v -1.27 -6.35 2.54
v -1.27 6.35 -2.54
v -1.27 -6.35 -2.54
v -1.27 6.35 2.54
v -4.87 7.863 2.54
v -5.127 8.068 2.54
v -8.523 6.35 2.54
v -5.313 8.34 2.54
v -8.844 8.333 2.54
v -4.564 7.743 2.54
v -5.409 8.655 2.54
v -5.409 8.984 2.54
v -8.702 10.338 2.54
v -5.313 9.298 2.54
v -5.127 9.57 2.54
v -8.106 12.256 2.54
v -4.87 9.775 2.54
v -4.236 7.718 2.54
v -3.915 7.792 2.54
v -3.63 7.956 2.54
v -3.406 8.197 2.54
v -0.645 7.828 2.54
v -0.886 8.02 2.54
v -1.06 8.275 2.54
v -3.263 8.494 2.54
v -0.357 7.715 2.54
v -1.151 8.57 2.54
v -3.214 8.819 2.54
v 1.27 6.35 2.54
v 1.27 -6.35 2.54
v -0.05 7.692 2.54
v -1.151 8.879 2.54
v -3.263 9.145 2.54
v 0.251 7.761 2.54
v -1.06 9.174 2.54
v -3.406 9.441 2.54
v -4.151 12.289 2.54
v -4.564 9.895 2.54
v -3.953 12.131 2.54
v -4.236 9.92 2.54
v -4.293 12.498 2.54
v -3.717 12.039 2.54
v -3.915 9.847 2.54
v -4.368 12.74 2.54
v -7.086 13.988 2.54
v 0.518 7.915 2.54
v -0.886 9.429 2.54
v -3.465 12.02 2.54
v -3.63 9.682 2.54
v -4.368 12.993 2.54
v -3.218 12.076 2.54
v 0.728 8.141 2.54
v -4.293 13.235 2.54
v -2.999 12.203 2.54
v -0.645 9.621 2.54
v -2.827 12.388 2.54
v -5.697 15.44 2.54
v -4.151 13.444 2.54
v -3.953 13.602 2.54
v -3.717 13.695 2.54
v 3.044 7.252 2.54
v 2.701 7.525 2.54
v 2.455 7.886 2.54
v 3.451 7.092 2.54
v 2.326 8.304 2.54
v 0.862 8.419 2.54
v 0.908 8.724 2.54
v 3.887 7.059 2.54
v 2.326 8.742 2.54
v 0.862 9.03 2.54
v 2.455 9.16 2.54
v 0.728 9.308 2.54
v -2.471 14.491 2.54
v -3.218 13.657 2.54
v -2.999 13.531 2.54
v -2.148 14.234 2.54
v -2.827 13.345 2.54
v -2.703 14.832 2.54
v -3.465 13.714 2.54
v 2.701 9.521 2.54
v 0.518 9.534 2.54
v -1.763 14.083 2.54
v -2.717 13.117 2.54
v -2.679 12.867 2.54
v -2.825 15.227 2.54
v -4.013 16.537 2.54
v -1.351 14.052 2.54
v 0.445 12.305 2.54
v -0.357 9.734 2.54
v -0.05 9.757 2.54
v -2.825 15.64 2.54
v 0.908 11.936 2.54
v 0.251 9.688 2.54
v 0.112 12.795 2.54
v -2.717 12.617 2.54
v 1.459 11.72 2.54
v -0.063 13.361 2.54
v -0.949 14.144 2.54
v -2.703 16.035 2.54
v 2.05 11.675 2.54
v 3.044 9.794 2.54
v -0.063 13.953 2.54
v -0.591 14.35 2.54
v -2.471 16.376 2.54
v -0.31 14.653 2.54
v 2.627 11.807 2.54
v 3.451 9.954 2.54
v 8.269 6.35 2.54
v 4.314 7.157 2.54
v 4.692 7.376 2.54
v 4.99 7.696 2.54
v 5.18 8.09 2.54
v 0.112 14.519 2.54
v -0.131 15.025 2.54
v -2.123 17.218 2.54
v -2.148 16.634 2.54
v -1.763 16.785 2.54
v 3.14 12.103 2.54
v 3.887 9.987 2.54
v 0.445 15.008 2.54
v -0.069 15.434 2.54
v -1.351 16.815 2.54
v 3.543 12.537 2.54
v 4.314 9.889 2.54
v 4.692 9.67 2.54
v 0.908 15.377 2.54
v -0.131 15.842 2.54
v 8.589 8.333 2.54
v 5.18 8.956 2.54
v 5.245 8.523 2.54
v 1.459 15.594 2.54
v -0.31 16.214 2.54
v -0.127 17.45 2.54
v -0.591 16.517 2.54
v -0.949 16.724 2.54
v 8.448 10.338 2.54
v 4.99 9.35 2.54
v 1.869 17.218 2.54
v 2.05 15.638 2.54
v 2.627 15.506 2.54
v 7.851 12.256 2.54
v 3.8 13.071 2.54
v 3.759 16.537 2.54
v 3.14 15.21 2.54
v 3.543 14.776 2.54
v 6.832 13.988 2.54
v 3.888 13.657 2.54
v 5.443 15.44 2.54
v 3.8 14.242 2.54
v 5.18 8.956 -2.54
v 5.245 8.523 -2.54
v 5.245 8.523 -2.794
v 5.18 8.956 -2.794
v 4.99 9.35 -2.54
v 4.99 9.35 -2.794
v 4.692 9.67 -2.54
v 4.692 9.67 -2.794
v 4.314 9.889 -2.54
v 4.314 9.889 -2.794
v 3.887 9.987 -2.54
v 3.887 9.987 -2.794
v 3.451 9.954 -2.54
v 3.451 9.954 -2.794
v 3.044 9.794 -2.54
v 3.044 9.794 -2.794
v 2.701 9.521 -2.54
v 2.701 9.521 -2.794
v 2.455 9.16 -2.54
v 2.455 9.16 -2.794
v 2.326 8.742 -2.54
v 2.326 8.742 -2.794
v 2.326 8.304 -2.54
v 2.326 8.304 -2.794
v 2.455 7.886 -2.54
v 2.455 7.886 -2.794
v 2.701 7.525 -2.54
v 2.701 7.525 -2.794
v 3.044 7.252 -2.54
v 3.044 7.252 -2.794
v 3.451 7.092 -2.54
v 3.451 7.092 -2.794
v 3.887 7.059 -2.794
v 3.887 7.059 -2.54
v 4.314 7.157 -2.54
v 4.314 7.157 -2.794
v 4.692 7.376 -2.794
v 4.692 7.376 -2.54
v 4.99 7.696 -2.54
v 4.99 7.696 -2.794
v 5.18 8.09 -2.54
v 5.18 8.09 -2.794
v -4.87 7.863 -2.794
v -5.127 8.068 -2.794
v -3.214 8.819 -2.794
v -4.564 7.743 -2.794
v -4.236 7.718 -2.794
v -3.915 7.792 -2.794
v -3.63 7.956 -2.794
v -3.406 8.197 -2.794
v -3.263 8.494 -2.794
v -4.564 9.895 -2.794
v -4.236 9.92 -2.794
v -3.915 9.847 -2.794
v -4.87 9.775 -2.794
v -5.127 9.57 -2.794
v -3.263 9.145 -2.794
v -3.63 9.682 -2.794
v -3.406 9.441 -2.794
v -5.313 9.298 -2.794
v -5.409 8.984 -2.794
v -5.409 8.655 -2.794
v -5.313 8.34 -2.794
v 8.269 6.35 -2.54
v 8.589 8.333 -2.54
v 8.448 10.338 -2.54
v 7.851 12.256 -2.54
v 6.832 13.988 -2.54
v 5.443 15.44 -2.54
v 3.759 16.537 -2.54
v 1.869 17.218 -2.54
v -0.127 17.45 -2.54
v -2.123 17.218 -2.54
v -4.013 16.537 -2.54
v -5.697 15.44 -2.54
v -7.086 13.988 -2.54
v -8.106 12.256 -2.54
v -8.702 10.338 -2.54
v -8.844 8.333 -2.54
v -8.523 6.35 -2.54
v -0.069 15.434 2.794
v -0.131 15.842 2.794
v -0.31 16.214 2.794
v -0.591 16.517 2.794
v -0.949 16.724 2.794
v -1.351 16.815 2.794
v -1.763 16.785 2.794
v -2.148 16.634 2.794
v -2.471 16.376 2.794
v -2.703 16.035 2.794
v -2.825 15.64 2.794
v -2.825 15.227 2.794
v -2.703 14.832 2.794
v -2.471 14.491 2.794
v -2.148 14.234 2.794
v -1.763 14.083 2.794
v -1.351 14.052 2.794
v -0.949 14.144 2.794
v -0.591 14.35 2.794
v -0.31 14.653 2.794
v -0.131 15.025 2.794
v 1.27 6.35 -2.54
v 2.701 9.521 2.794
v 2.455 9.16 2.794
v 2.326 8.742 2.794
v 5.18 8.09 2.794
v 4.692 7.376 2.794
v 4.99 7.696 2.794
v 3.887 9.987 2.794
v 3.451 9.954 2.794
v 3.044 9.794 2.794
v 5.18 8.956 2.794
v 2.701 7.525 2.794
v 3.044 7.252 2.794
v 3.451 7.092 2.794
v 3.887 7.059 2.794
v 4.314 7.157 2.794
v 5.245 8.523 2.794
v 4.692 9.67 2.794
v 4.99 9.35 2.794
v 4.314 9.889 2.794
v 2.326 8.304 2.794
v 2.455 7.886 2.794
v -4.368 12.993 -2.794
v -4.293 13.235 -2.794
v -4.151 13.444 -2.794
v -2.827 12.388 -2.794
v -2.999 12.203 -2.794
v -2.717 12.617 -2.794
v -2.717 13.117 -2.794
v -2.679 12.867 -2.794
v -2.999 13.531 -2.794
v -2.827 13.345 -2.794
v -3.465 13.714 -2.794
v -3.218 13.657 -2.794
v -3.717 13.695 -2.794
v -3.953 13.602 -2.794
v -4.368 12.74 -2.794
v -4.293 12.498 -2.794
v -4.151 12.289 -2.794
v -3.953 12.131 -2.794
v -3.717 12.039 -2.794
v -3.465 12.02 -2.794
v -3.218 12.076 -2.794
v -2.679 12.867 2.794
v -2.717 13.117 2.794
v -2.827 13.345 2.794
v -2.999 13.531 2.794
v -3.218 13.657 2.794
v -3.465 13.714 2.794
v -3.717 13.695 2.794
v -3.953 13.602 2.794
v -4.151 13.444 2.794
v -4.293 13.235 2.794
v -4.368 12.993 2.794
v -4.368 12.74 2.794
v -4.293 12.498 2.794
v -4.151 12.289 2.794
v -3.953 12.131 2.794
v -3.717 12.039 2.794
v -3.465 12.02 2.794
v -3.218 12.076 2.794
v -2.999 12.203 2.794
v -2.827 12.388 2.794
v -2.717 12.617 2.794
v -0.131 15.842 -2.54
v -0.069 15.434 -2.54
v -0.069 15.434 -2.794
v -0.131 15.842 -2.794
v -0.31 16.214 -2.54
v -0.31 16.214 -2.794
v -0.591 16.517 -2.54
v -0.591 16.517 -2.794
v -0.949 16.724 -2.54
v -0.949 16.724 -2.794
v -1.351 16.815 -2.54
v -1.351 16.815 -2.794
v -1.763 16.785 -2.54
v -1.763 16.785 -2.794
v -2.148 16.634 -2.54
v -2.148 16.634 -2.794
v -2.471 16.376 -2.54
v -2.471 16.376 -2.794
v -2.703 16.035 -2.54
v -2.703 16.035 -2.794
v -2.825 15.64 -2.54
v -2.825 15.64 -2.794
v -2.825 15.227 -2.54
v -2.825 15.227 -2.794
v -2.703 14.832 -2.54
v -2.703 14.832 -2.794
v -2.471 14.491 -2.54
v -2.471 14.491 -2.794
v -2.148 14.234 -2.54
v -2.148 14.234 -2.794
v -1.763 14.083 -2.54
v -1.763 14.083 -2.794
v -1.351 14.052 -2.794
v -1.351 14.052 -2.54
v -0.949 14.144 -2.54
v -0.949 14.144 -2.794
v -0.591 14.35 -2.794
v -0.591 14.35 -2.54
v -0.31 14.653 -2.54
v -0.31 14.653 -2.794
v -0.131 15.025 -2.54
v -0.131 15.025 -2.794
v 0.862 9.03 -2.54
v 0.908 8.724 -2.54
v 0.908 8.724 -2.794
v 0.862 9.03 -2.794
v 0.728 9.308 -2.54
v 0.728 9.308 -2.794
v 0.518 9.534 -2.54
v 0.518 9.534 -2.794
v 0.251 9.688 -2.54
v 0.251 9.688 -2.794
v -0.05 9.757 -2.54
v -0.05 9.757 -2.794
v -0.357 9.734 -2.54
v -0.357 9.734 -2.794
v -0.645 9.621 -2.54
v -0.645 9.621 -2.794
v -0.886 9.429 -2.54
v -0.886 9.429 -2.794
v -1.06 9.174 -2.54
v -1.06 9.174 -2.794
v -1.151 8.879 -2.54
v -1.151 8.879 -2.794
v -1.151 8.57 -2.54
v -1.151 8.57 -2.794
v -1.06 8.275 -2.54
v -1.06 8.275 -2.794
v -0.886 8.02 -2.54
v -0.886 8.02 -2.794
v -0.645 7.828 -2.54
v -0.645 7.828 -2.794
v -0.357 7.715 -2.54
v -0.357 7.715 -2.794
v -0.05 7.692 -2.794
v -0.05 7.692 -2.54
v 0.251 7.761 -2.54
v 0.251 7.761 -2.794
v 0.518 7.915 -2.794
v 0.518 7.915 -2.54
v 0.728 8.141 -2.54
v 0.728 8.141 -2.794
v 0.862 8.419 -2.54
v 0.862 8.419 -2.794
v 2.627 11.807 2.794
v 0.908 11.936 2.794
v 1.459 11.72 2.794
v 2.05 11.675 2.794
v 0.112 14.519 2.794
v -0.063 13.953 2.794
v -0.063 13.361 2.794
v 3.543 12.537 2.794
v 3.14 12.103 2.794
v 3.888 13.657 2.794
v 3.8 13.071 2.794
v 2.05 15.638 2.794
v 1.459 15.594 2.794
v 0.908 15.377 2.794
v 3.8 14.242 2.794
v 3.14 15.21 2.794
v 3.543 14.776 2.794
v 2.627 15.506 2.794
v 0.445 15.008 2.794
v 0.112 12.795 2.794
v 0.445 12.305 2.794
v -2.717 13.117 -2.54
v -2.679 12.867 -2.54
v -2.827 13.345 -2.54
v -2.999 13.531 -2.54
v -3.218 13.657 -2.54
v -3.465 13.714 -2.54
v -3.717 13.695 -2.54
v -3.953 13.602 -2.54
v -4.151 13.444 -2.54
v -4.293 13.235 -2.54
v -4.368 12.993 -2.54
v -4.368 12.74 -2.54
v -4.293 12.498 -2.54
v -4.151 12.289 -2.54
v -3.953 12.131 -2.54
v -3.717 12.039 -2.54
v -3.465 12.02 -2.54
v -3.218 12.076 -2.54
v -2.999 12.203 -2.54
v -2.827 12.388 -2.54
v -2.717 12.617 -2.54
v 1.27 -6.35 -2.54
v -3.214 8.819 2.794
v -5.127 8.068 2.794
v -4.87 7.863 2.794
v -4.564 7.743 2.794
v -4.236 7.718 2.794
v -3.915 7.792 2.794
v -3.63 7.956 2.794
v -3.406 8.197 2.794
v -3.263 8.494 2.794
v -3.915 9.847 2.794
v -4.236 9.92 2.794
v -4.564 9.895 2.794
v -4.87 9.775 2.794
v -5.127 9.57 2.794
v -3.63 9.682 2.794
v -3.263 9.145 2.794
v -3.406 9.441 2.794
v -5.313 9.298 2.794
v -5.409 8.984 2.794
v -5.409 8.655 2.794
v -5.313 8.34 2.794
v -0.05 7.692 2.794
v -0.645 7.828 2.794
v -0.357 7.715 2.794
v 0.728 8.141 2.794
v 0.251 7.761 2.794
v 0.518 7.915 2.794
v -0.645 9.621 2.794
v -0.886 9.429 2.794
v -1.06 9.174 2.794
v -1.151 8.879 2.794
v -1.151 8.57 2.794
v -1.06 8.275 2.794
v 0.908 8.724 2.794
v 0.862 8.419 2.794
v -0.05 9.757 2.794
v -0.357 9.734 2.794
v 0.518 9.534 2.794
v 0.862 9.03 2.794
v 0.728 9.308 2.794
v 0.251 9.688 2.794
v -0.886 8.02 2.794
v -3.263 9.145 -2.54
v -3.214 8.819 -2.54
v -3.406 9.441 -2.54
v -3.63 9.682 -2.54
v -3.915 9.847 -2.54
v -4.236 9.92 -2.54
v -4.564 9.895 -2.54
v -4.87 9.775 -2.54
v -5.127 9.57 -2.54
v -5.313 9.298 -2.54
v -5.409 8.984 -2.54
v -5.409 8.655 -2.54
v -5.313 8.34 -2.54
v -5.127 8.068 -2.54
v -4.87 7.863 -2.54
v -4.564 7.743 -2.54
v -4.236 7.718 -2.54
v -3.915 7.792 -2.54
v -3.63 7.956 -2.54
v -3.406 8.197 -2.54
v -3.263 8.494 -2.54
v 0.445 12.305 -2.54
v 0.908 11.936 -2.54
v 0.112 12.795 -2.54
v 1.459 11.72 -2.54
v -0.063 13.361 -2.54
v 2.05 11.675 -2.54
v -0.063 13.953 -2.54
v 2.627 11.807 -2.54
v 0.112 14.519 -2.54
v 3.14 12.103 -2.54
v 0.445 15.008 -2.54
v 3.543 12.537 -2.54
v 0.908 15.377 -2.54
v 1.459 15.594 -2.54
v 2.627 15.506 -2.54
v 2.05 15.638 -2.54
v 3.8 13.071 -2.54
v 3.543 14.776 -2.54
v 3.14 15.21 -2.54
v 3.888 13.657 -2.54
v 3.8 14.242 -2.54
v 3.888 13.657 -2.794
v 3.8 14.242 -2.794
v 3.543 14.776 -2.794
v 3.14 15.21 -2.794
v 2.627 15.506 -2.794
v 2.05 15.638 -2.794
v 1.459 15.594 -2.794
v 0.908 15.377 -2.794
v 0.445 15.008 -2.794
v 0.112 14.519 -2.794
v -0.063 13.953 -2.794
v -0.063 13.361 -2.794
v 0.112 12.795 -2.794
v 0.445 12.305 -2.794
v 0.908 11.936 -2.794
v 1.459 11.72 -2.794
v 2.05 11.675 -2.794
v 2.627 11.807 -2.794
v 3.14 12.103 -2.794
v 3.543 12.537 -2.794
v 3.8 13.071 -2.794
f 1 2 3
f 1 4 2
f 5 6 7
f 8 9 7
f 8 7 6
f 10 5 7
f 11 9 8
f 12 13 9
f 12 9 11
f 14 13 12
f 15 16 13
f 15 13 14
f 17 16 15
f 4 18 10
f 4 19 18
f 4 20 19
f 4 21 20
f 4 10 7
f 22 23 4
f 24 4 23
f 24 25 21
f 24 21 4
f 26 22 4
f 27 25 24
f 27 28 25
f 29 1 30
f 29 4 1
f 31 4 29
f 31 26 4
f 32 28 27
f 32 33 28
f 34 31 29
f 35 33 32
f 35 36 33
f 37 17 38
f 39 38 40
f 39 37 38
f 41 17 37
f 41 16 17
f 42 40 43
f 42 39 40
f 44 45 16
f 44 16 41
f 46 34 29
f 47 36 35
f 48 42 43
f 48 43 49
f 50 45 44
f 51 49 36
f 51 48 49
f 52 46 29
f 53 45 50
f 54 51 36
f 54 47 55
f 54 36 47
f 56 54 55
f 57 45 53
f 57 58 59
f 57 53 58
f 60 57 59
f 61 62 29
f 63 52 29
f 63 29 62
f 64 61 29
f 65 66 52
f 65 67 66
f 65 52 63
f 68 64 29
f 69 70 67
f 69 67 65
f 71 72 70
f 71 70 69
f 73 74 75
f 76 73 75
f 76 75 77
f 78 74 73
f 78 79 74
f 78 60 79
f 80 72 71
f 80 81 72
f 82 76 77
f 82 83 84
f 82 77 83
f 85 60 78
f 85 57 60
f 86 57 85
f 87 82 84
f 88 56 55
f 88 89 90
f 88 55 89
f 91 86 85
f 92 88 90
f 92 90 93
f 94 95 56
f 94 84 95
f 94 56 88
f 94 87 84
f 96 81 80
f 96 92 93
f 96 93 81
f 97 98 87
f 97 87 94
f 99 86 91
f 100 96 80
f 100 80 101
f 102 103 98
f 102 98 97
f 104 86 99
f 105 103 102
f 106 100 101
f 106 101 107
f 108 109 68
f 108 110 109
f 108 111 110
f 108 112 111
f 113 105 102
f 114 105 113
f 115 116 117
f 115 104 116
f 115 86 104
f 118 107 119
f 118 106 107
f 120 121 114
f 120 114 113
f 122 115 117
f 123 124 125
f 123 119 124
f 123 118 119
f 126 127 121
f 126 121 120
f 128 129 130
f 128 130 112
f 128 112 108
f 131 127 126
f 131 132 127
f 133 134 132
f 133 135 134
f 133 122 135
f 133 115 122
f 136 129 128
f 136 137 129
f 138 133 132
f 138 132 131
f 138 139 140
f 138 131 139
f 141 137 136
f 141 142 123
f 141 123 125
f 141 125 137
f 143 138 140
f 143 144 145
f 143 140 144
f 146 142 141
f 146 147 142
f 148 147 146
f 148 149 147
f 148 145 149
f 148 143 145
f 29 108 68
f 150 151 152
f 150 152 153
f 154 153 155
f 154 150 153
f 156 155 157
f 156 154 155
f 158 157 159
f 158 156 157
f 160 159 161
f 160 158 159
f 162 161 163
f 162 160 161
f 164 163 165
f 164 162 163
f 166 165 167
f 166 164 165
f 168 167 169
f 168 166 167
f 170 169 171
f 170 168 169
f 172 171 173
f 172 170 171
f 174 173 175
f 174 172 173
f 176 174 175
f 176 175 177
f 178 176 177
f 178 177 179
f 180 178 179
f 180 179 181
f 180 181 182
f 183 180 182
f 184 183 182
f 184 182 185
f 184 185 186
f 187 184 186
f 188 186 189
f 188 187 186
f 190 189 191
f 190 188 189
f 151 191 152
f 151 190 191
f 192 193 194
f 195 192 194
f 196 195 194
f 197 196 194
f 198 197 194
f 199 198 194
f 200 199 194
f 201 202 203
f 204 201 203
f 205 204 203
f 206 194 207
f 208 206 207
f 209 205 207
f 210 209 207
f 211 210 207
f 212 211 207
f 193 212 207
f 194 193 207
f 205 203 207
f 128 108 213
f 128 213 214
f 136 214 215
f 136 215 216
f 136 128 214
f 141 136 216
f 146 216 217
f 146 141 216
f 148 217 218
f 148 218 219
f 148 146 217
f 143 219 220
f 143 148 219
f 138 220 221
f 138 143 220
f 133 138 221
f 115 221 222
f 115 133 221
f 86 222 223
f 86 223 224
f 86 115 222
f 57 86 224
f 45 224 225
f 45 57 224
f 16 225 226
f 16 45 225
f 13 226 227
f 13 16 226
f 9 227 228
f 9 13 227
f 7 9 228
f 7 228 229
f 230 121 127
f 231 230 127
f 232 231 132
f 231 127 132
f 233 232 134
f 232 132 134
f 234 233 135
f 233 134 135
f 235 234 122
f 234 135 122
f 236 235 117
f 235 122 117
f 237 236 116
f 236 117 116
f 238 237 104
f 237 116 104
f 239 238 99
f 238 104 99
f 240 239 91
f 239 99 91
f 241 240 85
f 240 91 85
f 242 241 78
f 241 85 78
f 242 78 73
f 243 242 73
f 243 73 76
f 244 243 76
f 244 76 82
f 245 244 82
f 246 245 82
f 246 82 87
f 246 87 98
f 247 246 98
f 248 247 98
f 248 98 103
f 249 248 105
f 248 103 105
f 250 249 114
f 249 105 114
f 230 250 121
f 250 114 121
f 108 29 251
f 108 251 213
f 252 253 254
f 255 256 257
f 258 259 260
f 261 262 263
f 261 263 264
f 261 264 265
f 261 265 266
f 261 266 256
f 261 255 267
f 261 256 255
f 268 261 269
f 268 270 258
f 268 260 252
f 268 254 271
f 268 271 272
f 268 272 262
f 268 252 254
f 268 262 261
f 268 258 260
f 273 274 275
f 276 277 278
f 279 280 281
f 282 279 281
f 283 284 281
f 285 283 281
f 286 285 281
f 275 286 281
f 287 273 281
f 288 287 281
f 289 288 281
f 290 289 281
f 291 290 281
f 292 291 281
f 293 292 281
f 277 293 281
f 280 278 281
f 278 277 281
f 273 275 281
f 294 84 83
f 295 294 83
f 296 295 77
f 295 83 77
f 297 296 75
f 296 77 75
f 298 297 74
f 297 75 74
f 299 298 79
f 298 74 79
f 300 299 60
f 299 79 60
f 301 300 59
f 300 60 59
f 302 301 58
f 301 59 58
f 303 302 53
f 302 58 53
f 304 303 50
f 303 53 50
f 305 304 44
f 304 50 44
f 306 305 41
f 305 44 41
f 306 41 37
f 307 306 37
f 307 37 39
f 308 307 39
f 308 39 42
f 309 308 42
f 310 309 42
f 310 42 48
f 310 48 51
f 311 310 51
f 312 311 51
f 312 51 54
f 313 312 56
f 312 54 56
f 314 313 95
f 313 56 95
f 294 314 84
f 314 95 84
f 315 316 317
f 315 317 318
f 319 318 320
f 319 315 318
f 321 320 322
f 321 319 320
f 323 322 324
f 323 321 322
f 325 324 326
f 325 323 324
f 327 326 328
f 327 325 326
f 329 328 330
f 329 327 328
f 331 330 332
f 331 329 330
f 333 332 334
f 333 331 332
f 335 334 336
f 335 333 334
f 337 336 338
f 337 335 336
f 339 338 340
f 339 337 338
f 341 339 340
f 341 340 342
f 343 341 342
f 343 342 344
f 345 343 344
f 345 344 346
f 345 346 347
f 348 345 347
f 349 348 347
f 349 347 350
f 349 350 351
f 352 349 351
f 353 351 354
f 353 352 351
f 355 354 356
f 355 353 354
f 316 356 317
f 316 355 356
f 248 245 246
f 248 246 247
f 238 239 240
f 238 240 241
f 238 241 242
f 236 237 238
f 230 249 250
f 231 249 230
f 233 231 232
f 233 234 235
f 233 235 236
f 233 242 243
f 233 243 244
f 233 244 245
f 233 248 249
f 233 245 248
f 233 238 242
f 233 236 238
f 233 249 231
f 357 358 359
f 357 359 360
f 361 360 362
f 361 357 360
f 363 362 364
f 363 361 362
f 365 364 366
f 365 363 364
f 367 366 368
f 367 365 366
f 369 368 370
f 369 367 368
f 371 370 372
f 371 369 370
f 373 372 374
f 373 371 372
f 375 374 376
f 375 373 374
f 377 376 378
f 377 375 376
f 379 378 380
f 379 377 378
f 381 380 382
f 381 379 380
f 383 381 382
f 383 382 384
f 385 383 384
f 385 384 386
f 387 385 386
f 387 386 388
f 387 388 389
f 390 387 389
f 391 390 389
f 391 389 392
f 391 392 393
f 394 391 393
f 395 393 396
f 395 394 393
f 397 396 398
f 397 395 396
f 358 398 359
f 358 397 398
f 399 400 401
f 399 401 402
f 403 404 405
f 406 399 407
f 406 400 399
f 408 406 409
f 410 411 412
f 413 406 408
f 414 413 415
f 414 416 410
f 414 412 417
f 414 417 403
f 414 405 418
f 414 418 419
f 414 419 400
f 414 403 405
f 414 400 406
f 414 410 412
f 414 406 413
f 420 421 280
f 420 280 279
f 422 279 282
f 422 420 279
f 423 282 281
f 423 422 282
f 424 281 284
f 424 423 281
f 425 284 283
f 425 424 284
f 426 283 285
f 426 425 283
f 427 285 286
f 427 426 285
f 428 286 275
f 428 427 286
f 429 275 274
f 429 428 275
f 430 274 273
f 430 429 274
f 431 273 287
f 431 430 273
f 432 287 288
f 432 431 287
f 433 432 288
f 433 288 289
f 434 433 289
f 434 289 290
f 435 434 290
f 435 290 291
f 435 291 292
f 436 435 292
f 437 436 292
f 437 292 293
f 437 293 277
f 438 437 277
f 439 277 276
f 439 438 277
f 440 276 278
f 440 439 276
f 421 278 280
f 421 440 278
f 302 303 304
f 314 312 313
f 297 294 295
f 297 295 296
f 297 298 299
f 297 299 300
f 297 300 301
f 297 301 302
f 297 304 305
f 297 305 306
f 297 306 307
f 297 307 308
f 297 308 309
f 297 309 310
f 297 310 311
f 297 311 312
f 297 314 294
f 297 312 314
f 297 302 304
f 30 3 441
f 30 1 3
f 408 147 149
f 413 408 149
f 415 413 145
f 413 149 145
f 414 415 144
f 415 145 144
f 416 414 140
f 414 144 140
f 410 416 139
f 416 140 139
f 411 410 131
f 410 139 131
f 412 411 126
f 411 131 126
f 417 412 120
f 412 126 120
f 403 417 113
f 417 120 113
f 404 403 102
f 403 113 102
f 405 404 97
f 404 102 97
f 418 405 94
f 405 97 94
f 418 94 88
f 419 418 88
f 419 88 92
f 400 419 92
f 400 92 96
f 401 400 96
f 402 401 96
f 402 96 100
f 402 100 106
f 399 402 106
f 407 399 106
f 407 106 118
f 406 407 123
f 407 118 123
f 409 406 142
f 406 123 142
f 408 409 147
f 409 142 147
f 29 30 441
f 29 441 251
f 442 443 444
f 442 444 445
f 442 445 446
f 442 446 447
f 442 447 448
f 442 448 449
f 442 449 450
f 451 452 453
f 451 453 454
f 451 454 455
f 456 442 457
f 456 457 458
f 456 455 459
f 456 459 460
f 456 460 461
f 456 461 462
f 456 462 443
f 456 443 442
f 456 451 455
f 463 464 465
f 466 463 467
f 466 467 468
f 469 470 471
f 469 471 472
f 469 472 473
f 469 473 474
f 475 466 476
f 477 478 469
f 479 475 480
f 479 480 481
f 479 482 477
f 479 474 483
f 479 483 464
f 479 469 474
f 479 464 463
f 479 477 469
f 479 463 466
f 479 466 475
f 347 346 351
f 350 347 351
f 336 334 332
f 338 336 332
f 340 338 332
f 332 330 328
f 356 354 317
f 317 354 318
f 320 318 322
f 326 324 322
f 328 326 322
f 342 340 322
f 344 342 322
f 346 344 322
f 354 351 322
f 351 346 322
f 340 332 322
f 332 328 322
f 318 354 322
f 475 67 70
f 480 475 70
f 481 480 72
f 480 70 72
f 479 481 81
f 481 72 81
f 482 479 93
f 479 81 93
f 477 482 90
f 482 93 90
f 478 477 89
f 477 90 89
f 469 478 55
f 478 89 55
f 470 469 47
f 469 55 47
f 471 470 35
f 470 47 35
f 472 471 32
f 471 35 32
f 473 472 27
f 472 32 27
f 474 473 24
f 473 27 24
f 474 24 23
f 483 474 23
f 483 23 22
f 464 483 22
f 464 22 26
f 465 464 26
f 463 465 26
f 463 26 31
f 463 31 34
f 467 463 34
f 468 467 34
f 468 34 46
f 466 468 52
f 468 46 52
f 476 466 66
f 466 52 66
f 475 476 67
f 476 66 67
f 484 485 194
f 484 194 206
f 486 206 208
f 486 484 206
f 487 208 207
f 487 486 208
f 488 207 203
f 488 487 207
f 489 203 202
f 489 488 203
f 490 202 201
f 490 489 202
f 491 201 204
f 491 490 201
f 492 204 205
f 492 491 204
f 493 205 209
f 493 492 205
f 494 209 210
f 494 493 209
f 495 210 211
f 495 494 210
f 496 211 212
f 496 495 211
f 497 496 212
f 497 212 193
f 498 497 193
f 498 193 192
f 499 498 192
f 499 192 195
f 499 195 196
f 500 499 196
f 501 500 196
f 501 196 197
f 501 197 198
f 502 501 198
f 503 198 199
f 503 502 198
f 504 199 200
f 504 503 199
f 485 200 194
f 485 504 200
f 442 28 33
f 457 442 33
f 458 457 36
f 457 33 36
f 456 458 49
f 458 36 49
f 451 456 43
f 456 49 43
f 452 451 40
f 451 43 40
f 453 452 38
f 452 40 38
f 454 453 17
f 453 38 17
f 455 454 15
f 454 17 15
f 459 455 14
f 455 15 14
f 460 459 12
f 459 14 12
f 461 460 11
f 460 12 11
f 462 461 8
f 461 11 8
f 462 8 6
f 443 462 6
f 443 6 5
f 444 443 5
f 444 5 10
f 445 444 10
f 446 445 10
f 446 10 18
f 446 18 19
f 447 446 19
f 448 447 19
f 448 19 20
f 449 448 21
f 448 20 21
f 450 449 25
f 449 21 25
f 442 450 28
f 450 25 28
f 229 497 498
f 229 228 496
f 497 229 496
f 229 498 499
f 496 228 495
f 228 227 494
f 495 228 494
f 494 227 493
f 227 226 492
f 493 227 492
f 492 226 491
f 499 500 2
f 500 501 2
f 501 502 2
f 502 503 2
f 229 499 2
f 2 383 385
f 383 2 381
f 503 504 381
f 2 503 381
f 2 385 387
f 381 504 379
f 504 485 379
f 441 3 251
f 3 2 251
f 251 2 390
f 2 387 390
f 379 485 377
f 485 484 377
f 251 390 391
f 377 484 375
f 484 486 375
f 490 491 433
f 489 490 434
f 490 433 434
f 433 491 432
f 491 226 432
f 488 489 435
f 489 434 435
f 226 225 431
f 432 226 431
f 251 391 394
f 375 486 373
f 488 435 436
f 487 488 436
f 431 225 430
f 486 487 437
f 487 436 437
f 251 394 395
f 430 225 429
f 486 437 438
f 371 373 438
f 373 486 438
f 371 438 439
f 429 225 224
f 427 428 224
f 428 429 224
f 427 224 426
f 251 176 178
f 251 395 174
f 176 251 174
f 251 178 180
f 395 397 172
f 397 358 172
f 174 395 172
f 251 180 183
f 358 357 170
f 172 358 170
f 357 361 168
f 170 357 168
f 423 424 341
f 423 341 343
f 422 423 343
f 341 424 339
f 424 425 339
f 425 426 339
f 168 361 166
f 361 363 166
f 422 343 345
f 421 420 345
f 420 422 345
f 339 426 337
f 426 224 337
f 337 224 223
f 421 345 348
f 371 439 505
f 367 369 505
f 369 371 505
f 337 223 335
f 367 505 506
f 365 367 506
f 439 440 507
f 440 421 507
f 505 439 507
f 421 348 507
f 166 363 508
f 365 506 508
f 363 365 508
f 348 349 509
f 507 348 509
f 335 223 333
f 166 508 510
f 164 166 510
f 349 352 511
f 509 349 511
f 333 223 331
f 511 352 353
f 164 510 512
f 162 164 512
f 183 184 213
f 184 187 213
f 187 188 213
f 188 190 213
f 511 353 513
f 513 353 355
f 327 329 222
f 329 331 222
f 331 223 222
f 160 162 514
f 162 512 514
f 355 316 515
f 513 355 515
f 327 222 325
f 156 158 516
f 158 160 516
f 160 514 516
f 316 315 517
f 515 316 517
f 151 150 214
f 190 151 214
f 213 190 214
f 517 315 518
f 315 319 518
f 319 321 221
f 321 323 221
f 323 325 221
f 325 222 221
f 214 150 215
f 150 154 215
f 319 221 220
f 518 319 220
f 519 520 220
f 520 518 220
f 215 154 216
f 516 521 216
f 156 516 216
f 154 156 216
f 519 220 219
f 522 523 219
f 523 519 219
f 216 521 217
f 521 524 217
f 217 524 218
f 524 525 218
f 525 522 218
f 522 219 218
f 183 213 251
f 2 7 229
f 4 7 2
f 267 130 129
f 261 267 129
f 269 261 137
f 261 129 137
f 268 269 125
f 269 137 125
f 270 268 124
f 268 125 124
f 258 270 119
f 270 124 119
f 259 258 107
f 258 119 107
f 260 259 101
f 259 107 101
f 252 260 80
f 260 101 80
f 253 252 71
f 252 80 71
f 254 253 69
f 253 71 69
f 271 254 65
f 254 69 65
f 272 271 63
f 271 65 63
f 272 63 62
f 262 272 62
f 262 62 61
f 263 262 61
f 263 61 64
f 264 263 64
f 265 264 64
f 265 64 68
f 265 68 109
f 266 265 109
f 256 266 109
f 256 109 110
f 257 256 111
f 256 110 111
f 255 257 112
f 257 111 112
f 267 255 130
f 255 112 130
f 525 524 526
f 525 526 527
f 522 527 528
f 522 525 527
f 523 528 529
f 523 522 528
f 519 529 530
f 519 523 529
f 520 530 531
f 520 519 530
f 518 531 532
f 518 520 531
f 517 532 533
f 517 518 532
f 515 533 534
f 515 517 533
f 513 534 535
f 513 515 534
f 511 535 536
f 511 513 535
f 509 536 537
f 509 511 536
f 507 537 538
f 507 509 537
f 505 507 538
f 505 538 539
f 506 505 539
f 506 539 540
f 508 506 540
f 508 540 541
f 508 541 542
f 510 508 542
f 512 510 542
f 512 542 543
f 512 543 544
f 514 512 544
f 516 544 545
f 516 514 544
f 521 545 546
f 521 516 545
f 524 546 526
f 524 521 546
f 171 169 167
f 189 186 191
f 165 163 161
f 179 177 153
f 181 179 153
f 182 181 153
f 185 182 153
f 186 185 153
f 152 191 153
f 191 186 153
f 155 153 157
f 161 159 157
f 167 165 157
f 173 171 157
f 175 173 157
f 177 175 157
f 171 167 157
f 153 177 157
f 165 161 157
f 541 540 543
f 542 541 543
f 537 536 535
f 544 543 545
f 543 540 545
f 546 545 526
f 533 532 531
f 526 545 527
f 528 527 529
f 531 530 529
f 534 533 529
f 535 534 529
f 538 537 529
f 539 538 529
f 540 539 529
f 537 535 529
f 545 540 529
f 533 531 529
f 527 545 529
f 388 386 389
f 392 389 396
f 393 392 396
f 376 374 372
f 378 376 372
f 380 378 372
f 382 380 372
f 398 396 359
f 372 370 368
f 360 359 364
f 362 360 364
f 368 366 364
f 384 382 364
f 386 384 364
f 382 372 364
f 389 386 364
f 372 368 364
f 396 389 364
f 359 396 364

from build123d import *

# Parameters (mm, degrees)
F1_DEPTH = 2.54
F2_R     = 0.849257
F2_R_2   = 1.467639
F2_R_3   = 1.986785
F2_R_4   = 1.103769
F2_R_5   = 1.035394
F2_R_6   = 1.385658
F3_DEPTH = 0.254


with BuildPart() as f1:
    # F0 (on Top) → F1 (new body)
    with BuildSketch(Plane.XY):
        with BuildLine():
            Line((-1.269909, 0.074241), (-1.269909, -6.349547))
            Line((-1.269909, -6.349547), (1.269909, -6.349547))
            Line((1.269909, -6.349547), (1.269909, 0.111635))
            ThreePointArc((1.269909, 0.111635), (0.001368, 2e-05), (-1.269909, 0.074241))
        make_face()
        with BuildLine():
            Line((-1.269909, 6.349547), (-1.269909, 0.074241))
            ThreePointArc((-1.269909, 0.074241), (0.001368, 2e-05), (1.269909, 0.111635))
            Line((1.269909, 0.111635), (1.269909, 6.349547))
            Line((1.269909, 6.349547), (-1.269909, 6.349547))
        make_face()
        with BuildLine():
            Line((-8.52301, 6.349547), (-1.269909, 6.349547))
            Line((-1.269909, 6.349547), (1.269909, 6.349547))
            Line((1.269909, 6.349547), (8.268841, 6.349547))
            ThreePointArc((8.268841, 6.349547), (-0.127084, 17.449755), (-8.52301, 6.349547))
        make_face()
    extrude(amount=F1_DEPTH)

    # F2 (on face) → F3 (join)
    with BuildSketch(Plane.XY.offset(2.54)):
        with Locations((-3.528252, 12.866852)):
            Circle(F2_R)
        with Locations((3.777331, 8.522992)):
            Circle(F2_R_2)
        with Locations((1.901574, 13.656645)):
            Circle(F2_R_3)
        with Locations((-4.318044, 8.819164)):
            Circle(F2_R_4)
        with Locations((-0.127084, 8.724415)):
            Circle(F2_R_5)
        with Locations((-1.455046, 15.433677)):
            Circle(F2_R_6)
    extrude(amount=F3_DEPTH)

    # F4: F1 across plane


with BuildPart() as f1_1:
    add(f1.part)
    add(f1.part.mirror(Plane.XY))


solid = f1_1.part
